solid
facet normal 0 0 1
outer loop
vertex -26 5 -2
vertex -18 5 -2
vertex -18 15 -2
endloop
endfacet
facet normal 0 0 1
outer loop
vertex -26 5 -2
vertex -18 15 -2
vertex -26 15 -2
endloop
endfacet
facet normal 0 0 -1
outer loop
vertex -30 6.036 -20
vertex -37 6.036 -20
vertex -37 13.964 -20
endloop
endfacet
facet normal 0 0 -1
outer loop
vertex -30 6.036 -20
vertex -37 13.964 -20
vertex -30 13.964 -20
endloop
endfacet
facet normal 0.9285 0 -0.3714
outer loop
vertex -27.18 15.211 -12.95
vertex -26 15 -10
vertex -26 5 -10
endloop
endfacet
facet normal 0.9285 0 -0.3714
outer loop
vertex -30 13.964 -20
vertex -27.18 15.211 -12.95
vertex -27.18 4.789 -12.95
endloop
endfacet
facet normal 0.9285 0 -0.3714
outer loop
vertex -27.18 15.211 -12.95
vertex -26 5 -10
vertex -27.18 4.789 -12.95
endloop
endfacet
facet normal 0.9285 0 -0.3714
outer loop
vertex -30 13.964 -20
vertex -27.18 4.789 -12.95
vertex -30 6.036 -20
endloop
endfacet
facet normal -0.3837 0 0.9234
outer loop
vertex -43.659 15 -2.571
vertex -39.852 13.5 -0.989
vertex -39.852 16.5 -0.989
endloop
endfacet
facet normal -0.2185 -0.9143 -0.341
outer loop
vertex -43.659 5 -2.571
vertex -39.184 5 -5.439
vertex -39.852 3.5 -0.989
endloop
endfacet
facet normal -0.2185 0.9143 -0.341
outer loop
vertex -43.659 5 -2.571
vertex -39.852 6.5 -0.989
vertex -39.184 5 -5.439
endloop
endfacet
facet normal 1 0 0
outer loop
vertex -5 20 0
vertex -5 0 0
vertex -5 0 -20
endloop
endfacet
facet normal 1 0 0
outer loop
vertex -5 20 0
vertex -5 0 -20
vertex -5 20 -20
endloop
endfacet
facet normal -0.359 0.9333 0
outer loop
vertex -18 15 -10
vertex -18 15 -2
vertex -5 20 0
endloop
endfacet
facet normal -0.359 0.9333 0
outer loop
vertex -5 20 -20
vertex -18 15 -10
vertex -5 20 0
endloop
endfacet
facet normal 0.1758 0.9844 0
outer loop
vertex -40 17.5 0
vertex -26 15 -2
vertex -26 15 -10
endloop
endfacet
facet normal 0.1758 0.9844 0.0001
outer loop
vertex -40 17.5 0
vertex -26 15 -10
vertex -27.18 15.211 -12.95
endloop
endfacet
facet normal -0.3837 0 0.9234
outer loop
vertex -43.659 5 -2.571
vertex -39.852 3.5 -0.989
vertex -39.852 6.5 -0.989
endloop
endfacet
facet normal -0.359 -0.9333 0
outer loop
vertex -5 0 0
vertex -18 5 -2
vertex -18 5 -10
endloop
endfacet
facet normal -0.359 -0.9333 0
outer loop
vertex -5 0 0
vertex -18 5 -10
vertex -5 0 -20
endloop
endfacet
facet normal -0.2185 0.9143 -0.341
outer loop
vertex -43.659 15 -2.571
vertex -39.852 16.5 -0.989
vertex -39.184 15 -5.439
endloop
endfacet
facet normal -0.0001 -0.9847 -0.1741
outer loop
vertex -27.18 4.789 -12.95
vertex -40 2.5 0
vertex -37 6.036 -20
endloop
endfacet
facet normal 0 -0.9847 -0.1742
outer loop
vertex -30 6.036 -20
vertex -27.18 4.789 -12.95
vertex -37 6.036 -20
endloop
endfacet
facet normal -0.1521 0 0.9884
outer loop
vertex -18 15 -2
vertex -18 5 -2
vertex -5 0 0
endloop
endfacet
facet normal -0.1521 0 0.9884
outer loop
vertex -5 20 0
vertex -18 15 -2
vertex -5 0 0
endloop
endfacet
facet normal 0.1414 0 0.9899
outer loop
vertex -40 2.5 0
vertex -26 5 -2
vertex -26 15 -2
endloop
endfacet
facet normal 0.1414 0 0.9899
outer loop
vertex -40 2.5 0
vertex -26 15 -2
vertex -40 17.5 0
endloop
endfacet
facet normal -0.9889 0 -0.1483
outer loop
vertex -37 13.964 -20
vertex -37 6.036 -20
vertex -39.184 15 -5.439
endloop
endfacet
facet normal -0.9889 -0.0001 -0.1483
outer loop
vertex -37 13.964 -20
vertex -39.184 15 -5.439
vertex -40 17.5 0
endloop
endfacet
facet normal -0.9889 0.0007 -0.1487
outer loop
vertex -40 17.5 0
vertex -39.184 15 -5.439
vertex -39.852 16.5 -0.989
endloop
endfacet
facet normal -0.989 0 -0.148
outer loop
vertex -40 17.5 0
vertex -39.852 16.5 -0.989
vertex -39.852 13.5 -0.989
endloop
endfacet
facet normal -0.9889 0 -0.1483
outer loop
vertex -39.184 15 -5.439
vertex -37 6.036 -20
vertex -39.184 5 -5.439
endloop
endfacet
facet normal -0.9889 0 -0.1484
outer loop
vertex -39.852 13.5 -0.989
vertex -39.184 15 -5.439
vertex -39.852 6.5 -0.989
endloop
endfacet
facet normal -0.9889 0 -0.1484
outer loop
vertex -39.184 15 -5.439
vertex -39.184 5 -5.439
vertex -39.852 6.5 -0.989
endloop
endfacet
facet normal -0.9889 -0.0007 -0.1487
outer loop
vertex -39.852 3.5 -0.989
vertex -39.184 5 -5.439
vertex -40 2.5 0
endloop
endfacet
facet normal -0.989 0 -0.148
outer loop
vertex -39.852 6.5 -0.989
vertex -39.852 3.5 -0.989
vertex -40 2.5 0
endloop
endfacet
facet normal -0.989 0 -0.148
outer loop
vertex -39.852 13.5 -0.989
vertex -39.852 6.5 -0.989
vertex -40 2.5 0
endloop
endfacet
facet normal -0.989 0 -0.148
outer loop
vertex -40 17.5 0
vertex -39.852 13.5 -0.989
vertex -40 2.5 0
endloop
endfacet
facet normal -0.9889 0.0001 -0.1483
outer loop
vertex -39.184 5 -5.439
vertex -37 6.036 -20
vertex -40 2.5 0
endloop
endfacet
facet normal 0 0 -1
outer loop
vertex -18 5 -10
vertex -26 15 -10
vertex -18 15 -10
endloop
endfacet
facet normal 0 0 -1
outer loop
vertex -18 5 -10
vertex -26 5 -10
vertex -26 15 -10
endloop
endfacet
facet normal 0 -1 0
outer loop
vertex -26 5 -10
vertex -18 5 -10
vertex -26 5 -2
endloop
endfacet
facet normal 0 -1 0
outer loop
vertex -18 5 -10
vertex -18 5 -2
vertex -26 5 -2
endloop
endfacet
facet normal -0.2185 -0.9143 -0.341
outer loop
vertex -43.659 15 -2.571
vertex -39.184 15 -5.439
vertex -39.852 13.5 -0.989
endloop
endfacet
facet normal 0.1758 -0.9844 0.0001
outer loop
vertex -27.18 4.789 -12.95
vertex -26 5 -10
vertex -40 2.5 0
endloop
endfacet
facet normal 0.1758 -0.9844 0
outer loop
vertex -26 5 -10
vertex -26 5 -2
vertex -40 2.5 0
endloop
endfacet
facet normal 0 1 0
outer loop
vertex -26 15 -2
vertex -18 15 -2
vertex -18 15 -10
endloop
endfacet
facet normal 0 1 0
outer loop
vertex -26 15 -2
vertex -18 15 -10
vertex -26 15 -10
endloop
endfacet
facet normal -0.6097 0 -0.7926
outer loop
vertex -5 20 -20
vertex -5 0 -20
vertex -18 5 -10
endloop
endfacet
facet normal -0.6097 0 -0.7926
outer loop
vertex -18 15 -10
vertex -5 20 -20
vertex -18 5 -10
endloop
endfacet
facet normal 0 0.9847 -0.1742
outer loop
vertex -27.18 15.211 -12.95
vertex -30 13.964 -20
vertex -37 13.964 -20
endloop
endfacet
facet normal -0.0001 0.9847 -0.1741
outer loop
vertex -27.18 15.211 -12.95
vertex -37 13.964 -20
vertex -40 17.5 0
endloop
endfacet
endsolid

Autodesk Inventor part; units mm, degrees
sketch "Sketch1" plane through (0, 0, 0) normal (0, 1, 0) x (-1, 0, 0)
  line L0 (0, 0) -> (40, 0)
  line L1 (0, 0) -> (0, -20)
  line L2 (0, 0) -> (0, -10)
  line L3 (37, -20) -> (40, 0)
  line L4 (37, -20) -> (30, -20)
  line L5 (26, -10) -> (30, -20)
  line L6 (26, -10) -> (18, -10)
  line L7 (0, -20) -> (5, -20)
  line L8 (5, -20) -> (18, -10)
  line L9 (18, 0) -> (18, -2)
  line L10 (18, -2) -> (5, 0)
  line L11 (18, -2) -> (26, -2)
  line L12 (26, -2) -> (40, 0)
  dimension "d1" = 40
  dimension "d2" = 20
  dimension "d7" = 10
  dimension "d8" = 37
  dimension "d9" = 7
  dimension "d10" = 26
  dimension "d11" = 8
  dimension "d12" = 5
  dimension "d33" = 2
extrude "Extrusion1" add sketch "Sketch1" along normal blind 20 contours L0 L10 L11 L12 L3 L4 L5 L6 L8 L7 L1
sketch "Sketch2" plane through (-40, 0, 0) normal (0, 0, 1) x (1, 0, 0)
  line L0 (3, 0) -> (3, 20) projected
  line L1 (10, 0) -> (10, 20) projected
  line L2 (14, 0) -> (14, 20) projected
  line L3 (22, 0) -> (22, 20) projected
  line L4 (35, 0) -> (35, 20) projected
  line L5 (40, 0) -> (40, 20) projected
  line L6 (0, 0) -> (0, 20) projected
  line L7 (0, 20) -> (40, 20) projected
  line L8 (35, 0) -> (40, 0) projected
  line L9 (40, 0) -> (40, 20) projected
  line L10 (35, 20) -> (40, 20) projected
  line L11 (40, 0) -> (40, 20) projected
  line L12 (40, 10) -> (0, 10)
  line L13 (22, 0) -> (22, 5)
  line L14 (35, 0) -> (22, 0) projected
  line L15 (22, 5) -> (35, 0)
  line L16 (22, 5) -> (14, 5)
  line L17 (10, 0) -> (10, 2.5)
  line L18 (10, 2.5) -> (14, 5)
  line L19 (10, 2.5) -> (3, 2.5)
  line L20 (22, 15) -> (35, 20)
  line L21 (22, 15) -> (14, 15)
  line L22 (10, 17.5) -> (14, 15)
  line L23 (10, 17.5) -> (3, 17.5)
  line L24 (3, 17.5) -> (0, 17.5)
  line L25 (3, 2.5) -> (0, 2.5)
  line L26 (14, 5) -> (0, 2.5)
  line L27 (14, 15) -> (0, 17.5)
  line L28 (35, 0) -> (35, 20) projected
  line L29 (0, 0) -> (14, 0) projected
  line L30 (0, 0) -> (40, 0)
  dimension "d15" = 5
  dimension "d16" = 2.5
extrude "Extrusion2" cut sketch "Sketch2" against normal blind 20 contours L29 L6 L25 L0 | L0 L19 L1 L29 | L25 L26 L0 | L0 L26 L1 L19 | L1 L18 L2 L29 | L1 L26 L18 | L2 L16 L3 L30 | L3 L15 L14 | L27 L24 L0 | L0 L23 L1 L27 | L6 L7 L0 L24 | L4 L12 L5 L8 | L0 L7 L1 L23 | L1 L22 L27 | L22 L1 L7 L2 | L2 L7 L3 L21 | L4 L7 L5 L12 | L3 L7 L20
ref_plane "Work Plane1" through (-40, 0, 0) normal (1, 0, 0) x (0, 0, -1)
sketch "Sketch4" plane through (-40, 0, 0) normal (1, 0, 0) x (0, 0, -1)
  line L0 (0, 17.5) -> (20, 16.9643) projected
  line L1 (20, 3.0357) -> (20, 16.9643) projected
  line L2 (20, 3.0357) -> (0, 2.5) projected
  line L3 (20, 3.0357) -> (20, 16.9643) projected
  line L4 (20, 3.0357) -> (20, 6.0357)
  line L5 (20, 16.9643) -> (20, 13.9643)
  line L6 (20, 4.2857) -> (20, 15.7143) projected
  line L7 (0, 2.5) -> (0, 17.5) projected
  line L8 (0, 2.5) -> (20, 6.0357)
  line L9 (0, 17.5) -> (20, 16.9643) projected
  line L10 (20, 13.9643) -> (0, 17.5)
  point P0 (0, 0)
  dimension "d24" = 3
  dimension "d25" = 3
extrude "Extrusion4" cut sketch "Sketch4" along normal blind 22 contours L0 L1 L10 | L8 L1 L2
sketch "Sketch5" plane through (-40, 2.5, 0) normal (-0.9889364, 0, -0.1483405) x (-0.1483405, 0, 0.9889364)
  line L0 (0, 0) -> (0, 15) projected
  line L1 (0, 14) -> (-1, 14)
  line L2 (-4.0546, 12.5) -> (-11.9661, 12.5) projected
  line L3 (-5.5, 12.5) -> (-1, 14)
  line L4 (0, 11) -> (-1, 11)
  line L5 (-1, 14) -> (-1, 11)
  line L6 (-5.5, 12.5) -> (-1, 11)
  point P0 (-5.9336, -2.5)
  point P1 (-4.8339, 12.5)
  dimension "d53" = 1
  dimension "d55" = 1
ref_plane "Work Plane3" through (-43.9557, 2.5, -0.5934) normal (-0.9889364, 0, -0.1483405) x (-0.1483405, 0, 0.9889364)
sketch "Sketch8" plane through (-43.9557, 2.5, -0.5934) normal (-0.9889364, 0, -0.1483405) x (-0.1483405, 0, 0.9889364)
  line L0 (-5.5, 12.5) -> (-1, 14) projected
  line L1 (-1, 14) -> (-1, 11) projected
  line L2 (-5.5, 12.5) -> (-1, 11) projected
  line L3 (-1, 12.5) -> (-2, 12.5)
  point P0 (-5.9336, -2.5)
  dimension "d56" = 1
loft "Loft3" add profiles "Sketch5" section 1 point at (-43.6591, 15, -2.5712) contours L6 L3 L5
ref_plane "Work Plane4" through (-37, 10, -42.4242) normal (0, 1, 0) x (1, 0, 0)
mirror "Mirror1" about plane through (-37, 10, -42.4242) normal (0, 1, 0) of "Loft3"
properties part number "horse"
